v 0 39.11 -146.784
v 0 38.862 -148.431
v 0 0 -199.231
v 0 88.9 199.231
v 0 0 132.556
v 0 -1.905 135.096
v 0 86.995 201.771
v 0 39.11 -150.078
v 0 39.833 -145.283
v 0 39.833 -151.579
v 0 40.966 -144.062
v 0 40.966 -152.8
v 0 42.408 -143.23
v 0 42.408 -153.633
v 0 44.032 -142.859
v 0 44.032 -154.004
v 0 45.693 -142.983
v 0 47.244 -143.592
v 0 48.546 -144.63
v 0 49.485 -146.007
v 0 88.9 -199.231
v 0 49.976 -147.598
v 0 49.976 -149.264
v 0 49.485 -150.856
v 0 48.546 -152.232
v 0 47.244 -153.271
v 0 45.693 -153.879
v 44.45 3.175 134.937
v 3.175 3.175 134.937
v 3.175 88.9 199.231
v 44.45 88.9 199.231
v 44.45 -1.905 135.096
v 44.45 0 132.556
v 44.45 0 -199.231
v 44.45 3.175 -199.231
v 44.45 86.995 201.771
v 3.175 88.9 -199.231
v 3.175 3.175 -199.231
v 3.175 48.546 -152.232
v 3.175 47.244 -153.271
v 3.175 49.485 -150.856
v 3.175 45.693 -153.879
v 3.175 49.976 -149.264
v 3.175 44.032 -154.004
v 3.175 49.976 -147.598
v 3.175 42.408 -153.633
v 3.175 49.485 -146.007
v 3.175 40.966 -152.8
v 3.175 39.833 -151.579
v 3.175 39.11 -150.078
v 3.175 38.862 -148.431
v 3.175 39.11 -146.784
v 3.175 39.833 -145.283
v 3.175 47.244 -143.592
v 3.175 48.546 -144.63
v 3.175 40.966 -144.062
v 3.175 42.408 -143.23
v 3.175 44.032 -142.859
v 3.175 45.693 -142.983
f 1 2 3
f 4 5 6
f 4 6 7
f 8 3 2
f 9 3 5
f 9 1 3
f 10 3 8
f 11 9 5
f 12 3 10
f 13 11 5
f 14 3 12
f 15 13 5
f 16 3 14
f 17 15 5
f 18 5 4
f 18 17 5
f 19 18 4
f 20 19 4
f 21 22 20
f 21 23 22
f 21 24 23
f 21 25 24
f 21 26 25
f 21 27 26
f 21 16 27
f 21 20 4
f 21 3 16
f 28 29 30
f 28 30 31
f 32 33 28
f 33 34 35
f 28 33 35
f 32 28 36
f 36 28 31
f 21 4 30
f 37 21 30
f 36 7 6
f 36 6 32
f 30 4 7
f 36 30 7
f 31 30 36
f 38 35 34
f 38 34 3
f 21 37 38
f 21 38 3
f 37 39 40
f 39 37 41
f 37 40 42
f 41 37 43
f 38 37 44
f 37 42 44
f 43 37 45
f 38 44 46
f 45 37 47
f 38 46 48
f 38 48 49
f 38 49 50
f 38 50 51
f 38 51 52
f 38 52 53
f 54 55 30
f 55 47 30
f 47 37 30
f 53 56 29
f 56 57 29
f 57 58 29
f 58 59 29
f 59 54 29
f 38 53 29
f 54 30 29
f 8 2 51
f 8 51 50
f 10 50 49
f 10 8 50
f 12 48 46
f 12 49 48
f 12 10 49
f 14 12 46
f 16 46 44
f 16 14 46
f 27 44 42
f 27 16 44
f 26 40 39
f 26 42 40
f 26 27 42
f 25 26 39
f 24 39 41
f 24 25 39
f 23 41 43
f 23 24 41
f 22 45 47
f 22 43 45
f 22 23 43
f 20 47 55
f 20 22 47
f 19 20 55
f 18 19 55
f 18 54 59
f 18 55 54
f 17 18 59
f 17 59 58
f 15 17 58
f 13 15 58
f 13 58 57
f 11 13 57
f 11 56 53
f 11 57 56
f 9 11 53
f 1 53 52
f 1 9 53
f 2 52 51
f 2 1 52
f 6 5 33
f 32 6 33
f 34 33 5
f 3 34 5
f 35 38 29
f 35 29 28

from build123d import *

# Parameters (mm, degrees)
BOSS_EXTRUDE1_DEPTH     = 199.23125
CUT_EXTRUDE3_DEPTH      = 223.035867827
CUT_EXTRUDE3_DEPTH_BACK = 223.035867827
SKETCH4_R               = 5.588
SKETCH5_W               = 44.45
SKETCH5_H               = 111.125148887
BOSS_EXTRUDE3_DEPTH     = 3.175


with BuildPart() as part:
    # Sketch1 → Boss-Extrude1 (new, symmetric)
    with BuildSketch(Plane.XY):
        Polygon((3.175, 88.9), (3.175, 3.175), (44.45, 3.175), (44.45, 0), (0, 0), (0, 88.9), align=None)
    extrude(amount=BOSS_EXTRUDE1_DEPTH, both=True)

    # Sketch4 → Cut-Extrude3 (cut, two sides: drawn at the far end of the back side and taken through both)
    with BuildSketch(Plane(origin=(3.175, 0, 0), x_dir=(0, 0, -1), z_dir=(1, 0, 0)).offset(-CUT_EXTRUDE3_DEPTH_BACK)):
        with Locations(Location((148.43125, 44.45, 0), (0, 0, 270))):
            Circle(SKETCH4_R)
        Polygon((-199.23125, 88.9), (-132.556001855, 0), (-199.23125, 0), align=None)
    extrude(amount=CUT_EXTRUDE3_DEPTH + CUT_EXTRUDE3_DEPTH_BACK, mode=Mode.SUBTRACT)

    # Sketch5 → Boss-Extrude3 (add)
    with BuildSketch(Plane(origin=(0, -63.626947194, 84.835613859), x_dir=(1, 0, 0), z_dir=(0, -0.6000014291326674, 0.7999989281485049))):
        with Locations((22.225, 135.096364997)):
            Rectangle(SKETCH5_W, SKETCH5_H)
    extrude(amount=BOSS_EXTRUDE3_DEPTH)


solid = part.part
